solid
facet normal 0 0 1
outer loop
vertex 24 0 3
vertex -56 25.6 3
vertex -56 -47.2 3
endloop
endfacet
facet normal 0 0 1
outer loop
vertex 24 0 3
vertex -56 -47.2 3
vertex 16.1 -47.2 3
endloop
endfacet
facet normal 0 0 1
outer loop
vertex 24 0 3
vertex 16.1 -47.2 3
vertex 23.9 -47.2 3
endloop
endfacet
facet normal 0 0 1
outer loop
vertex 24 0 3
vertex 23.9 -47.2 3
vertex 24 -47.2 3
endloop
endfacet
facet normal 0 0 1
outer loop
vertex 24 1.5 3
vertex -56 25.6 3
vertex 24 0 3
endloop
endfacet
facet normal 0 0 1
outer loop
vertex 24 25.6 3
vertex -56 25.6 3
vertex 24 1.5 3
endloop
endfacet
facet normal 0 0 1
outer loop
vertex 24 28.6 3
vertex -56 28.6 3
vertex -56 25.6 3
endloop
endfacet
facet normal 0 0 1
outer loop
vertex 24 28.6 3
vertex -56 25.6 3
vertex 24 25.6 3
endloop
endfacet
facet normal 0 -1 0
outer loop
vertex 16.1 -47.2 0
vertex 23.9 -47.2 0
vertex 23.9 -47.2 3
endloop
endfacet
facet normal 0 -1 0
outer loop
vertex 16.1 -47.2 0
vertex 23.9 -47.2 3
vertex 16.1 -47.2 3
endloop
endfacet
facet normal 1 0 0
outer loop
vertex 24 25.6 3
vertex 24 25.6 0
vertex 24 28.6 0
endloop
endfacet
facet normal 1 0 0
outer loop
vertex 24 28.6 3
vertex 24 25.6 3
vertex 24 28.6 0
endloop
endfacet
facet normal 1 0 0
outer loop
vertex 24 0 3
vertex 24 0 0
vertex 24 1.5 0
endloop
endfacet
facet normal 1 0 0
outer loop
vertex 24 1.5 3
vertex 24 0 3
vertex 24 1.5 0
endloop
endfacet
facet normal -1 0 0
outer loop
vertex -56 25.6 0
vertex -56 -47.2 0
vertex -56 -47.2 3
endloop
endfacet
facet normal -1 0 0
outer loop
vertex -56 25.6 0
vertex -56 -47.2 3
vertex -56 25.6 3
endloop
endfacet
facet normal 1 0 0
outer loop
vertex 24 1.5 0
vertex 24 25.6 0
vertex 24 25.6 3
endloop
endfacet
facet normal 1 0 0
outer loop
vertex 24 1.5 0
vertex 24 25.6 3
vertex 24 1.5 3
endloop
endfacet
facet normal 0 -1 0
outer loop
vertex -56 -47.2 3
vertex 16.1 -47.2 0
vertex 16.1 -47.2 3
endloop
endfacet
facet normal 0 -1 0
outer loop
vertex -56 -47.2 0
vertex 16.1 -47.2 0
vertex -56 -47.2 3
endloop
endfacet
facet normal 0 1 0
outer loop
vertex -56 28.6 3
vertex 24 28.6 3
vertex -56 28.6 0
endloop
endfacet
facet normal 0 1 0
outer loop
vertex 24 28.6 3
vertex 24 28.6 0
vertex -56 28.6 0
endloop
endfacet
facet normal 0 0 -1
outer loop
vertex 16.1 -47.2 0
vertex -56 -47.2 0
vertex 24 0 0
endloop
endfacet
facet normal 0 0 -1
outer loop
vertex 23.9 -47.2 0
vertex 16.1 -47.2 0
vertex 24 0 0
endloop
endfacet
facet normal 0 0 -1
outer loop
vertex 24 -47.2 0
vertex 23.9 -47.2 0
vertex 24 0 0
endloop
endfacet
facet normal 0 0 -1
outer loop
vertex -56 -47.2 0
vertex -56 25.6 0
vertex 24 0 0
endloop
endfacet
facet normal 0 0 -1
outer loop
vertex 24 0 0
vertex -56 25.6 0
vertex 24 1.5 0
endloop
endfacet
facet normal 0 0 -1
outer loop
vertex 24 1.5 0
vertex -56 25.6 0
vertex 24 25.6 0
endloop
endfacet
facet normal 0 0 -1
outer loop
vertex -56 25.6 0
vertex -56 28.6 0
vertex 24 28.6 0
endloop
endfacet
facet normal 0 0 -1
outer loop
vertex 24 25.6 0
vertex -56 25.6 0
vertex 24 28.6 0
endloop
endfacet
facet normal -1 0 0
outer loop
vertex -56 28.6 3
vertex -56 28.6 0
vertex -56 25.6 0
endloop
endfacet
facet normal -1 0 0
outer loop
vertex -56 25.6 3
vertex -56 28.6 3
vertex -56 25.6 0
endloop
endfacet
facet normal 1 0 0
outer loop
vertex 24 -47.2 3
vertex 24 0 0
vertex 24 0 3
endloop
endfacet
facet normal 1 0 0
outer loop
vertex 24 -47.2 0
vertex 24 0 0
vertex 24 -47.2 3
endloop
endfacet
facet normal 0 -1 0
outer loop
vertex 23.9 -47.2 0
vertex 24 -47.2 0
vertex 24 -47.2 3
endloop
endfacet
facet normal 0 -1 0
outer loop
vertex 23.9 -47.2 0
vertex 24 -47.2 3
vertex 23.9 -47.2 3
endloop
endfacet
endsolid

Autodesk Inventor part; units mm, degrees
ref_plane "YZ Plane" through (0, 0, 0) normal (1, 0, 0) x (0, 1, 0)
ref_plane "XZ Plane" through (0, 0, 0) normal (0, 1, 0) x (-1, 0, 0)
ref_plane "XY Plane" through (0, 0, 0) normal (0, 0, 1) x (1, 0, 0)
sketch "Esboço1" plane through (0, 0, 0) normal (0, 0, 1) x (1, 0, 0)
  line L0 (-50.3718, 0) -> (-50.3718, 1.5) projected
  line L1 (24, 0) -> (24, 1.5) projected
  line L2 (-73.0466, 25.6) -> (-75.024, 25.6) projected
  line L3 (23.9, -47.2) -> (16.1, -47.2) projected
  line L4 (24, 25.6) -> (24, -47.2)
  line L5 (24, -47.2) -> (-56, -47.2)
  line L6 (-56, -47.2) -> (-56, 25.6)
  line L7 (24, 25.6) -> (24, 28.6)
  line L8 (24, 28.6) -> (-56, 28.6)
  line L9 (-56, 28.6) -> (-56, 25.6)
  point P0 (0, 0)
  point P1 (-56, 1.5)
  point P2 (-56, 0)
  dimension "d0" = 80
extrude "Extrusão1" add sketch "Esboço1" along normal blind 3
properties part number "trás"
